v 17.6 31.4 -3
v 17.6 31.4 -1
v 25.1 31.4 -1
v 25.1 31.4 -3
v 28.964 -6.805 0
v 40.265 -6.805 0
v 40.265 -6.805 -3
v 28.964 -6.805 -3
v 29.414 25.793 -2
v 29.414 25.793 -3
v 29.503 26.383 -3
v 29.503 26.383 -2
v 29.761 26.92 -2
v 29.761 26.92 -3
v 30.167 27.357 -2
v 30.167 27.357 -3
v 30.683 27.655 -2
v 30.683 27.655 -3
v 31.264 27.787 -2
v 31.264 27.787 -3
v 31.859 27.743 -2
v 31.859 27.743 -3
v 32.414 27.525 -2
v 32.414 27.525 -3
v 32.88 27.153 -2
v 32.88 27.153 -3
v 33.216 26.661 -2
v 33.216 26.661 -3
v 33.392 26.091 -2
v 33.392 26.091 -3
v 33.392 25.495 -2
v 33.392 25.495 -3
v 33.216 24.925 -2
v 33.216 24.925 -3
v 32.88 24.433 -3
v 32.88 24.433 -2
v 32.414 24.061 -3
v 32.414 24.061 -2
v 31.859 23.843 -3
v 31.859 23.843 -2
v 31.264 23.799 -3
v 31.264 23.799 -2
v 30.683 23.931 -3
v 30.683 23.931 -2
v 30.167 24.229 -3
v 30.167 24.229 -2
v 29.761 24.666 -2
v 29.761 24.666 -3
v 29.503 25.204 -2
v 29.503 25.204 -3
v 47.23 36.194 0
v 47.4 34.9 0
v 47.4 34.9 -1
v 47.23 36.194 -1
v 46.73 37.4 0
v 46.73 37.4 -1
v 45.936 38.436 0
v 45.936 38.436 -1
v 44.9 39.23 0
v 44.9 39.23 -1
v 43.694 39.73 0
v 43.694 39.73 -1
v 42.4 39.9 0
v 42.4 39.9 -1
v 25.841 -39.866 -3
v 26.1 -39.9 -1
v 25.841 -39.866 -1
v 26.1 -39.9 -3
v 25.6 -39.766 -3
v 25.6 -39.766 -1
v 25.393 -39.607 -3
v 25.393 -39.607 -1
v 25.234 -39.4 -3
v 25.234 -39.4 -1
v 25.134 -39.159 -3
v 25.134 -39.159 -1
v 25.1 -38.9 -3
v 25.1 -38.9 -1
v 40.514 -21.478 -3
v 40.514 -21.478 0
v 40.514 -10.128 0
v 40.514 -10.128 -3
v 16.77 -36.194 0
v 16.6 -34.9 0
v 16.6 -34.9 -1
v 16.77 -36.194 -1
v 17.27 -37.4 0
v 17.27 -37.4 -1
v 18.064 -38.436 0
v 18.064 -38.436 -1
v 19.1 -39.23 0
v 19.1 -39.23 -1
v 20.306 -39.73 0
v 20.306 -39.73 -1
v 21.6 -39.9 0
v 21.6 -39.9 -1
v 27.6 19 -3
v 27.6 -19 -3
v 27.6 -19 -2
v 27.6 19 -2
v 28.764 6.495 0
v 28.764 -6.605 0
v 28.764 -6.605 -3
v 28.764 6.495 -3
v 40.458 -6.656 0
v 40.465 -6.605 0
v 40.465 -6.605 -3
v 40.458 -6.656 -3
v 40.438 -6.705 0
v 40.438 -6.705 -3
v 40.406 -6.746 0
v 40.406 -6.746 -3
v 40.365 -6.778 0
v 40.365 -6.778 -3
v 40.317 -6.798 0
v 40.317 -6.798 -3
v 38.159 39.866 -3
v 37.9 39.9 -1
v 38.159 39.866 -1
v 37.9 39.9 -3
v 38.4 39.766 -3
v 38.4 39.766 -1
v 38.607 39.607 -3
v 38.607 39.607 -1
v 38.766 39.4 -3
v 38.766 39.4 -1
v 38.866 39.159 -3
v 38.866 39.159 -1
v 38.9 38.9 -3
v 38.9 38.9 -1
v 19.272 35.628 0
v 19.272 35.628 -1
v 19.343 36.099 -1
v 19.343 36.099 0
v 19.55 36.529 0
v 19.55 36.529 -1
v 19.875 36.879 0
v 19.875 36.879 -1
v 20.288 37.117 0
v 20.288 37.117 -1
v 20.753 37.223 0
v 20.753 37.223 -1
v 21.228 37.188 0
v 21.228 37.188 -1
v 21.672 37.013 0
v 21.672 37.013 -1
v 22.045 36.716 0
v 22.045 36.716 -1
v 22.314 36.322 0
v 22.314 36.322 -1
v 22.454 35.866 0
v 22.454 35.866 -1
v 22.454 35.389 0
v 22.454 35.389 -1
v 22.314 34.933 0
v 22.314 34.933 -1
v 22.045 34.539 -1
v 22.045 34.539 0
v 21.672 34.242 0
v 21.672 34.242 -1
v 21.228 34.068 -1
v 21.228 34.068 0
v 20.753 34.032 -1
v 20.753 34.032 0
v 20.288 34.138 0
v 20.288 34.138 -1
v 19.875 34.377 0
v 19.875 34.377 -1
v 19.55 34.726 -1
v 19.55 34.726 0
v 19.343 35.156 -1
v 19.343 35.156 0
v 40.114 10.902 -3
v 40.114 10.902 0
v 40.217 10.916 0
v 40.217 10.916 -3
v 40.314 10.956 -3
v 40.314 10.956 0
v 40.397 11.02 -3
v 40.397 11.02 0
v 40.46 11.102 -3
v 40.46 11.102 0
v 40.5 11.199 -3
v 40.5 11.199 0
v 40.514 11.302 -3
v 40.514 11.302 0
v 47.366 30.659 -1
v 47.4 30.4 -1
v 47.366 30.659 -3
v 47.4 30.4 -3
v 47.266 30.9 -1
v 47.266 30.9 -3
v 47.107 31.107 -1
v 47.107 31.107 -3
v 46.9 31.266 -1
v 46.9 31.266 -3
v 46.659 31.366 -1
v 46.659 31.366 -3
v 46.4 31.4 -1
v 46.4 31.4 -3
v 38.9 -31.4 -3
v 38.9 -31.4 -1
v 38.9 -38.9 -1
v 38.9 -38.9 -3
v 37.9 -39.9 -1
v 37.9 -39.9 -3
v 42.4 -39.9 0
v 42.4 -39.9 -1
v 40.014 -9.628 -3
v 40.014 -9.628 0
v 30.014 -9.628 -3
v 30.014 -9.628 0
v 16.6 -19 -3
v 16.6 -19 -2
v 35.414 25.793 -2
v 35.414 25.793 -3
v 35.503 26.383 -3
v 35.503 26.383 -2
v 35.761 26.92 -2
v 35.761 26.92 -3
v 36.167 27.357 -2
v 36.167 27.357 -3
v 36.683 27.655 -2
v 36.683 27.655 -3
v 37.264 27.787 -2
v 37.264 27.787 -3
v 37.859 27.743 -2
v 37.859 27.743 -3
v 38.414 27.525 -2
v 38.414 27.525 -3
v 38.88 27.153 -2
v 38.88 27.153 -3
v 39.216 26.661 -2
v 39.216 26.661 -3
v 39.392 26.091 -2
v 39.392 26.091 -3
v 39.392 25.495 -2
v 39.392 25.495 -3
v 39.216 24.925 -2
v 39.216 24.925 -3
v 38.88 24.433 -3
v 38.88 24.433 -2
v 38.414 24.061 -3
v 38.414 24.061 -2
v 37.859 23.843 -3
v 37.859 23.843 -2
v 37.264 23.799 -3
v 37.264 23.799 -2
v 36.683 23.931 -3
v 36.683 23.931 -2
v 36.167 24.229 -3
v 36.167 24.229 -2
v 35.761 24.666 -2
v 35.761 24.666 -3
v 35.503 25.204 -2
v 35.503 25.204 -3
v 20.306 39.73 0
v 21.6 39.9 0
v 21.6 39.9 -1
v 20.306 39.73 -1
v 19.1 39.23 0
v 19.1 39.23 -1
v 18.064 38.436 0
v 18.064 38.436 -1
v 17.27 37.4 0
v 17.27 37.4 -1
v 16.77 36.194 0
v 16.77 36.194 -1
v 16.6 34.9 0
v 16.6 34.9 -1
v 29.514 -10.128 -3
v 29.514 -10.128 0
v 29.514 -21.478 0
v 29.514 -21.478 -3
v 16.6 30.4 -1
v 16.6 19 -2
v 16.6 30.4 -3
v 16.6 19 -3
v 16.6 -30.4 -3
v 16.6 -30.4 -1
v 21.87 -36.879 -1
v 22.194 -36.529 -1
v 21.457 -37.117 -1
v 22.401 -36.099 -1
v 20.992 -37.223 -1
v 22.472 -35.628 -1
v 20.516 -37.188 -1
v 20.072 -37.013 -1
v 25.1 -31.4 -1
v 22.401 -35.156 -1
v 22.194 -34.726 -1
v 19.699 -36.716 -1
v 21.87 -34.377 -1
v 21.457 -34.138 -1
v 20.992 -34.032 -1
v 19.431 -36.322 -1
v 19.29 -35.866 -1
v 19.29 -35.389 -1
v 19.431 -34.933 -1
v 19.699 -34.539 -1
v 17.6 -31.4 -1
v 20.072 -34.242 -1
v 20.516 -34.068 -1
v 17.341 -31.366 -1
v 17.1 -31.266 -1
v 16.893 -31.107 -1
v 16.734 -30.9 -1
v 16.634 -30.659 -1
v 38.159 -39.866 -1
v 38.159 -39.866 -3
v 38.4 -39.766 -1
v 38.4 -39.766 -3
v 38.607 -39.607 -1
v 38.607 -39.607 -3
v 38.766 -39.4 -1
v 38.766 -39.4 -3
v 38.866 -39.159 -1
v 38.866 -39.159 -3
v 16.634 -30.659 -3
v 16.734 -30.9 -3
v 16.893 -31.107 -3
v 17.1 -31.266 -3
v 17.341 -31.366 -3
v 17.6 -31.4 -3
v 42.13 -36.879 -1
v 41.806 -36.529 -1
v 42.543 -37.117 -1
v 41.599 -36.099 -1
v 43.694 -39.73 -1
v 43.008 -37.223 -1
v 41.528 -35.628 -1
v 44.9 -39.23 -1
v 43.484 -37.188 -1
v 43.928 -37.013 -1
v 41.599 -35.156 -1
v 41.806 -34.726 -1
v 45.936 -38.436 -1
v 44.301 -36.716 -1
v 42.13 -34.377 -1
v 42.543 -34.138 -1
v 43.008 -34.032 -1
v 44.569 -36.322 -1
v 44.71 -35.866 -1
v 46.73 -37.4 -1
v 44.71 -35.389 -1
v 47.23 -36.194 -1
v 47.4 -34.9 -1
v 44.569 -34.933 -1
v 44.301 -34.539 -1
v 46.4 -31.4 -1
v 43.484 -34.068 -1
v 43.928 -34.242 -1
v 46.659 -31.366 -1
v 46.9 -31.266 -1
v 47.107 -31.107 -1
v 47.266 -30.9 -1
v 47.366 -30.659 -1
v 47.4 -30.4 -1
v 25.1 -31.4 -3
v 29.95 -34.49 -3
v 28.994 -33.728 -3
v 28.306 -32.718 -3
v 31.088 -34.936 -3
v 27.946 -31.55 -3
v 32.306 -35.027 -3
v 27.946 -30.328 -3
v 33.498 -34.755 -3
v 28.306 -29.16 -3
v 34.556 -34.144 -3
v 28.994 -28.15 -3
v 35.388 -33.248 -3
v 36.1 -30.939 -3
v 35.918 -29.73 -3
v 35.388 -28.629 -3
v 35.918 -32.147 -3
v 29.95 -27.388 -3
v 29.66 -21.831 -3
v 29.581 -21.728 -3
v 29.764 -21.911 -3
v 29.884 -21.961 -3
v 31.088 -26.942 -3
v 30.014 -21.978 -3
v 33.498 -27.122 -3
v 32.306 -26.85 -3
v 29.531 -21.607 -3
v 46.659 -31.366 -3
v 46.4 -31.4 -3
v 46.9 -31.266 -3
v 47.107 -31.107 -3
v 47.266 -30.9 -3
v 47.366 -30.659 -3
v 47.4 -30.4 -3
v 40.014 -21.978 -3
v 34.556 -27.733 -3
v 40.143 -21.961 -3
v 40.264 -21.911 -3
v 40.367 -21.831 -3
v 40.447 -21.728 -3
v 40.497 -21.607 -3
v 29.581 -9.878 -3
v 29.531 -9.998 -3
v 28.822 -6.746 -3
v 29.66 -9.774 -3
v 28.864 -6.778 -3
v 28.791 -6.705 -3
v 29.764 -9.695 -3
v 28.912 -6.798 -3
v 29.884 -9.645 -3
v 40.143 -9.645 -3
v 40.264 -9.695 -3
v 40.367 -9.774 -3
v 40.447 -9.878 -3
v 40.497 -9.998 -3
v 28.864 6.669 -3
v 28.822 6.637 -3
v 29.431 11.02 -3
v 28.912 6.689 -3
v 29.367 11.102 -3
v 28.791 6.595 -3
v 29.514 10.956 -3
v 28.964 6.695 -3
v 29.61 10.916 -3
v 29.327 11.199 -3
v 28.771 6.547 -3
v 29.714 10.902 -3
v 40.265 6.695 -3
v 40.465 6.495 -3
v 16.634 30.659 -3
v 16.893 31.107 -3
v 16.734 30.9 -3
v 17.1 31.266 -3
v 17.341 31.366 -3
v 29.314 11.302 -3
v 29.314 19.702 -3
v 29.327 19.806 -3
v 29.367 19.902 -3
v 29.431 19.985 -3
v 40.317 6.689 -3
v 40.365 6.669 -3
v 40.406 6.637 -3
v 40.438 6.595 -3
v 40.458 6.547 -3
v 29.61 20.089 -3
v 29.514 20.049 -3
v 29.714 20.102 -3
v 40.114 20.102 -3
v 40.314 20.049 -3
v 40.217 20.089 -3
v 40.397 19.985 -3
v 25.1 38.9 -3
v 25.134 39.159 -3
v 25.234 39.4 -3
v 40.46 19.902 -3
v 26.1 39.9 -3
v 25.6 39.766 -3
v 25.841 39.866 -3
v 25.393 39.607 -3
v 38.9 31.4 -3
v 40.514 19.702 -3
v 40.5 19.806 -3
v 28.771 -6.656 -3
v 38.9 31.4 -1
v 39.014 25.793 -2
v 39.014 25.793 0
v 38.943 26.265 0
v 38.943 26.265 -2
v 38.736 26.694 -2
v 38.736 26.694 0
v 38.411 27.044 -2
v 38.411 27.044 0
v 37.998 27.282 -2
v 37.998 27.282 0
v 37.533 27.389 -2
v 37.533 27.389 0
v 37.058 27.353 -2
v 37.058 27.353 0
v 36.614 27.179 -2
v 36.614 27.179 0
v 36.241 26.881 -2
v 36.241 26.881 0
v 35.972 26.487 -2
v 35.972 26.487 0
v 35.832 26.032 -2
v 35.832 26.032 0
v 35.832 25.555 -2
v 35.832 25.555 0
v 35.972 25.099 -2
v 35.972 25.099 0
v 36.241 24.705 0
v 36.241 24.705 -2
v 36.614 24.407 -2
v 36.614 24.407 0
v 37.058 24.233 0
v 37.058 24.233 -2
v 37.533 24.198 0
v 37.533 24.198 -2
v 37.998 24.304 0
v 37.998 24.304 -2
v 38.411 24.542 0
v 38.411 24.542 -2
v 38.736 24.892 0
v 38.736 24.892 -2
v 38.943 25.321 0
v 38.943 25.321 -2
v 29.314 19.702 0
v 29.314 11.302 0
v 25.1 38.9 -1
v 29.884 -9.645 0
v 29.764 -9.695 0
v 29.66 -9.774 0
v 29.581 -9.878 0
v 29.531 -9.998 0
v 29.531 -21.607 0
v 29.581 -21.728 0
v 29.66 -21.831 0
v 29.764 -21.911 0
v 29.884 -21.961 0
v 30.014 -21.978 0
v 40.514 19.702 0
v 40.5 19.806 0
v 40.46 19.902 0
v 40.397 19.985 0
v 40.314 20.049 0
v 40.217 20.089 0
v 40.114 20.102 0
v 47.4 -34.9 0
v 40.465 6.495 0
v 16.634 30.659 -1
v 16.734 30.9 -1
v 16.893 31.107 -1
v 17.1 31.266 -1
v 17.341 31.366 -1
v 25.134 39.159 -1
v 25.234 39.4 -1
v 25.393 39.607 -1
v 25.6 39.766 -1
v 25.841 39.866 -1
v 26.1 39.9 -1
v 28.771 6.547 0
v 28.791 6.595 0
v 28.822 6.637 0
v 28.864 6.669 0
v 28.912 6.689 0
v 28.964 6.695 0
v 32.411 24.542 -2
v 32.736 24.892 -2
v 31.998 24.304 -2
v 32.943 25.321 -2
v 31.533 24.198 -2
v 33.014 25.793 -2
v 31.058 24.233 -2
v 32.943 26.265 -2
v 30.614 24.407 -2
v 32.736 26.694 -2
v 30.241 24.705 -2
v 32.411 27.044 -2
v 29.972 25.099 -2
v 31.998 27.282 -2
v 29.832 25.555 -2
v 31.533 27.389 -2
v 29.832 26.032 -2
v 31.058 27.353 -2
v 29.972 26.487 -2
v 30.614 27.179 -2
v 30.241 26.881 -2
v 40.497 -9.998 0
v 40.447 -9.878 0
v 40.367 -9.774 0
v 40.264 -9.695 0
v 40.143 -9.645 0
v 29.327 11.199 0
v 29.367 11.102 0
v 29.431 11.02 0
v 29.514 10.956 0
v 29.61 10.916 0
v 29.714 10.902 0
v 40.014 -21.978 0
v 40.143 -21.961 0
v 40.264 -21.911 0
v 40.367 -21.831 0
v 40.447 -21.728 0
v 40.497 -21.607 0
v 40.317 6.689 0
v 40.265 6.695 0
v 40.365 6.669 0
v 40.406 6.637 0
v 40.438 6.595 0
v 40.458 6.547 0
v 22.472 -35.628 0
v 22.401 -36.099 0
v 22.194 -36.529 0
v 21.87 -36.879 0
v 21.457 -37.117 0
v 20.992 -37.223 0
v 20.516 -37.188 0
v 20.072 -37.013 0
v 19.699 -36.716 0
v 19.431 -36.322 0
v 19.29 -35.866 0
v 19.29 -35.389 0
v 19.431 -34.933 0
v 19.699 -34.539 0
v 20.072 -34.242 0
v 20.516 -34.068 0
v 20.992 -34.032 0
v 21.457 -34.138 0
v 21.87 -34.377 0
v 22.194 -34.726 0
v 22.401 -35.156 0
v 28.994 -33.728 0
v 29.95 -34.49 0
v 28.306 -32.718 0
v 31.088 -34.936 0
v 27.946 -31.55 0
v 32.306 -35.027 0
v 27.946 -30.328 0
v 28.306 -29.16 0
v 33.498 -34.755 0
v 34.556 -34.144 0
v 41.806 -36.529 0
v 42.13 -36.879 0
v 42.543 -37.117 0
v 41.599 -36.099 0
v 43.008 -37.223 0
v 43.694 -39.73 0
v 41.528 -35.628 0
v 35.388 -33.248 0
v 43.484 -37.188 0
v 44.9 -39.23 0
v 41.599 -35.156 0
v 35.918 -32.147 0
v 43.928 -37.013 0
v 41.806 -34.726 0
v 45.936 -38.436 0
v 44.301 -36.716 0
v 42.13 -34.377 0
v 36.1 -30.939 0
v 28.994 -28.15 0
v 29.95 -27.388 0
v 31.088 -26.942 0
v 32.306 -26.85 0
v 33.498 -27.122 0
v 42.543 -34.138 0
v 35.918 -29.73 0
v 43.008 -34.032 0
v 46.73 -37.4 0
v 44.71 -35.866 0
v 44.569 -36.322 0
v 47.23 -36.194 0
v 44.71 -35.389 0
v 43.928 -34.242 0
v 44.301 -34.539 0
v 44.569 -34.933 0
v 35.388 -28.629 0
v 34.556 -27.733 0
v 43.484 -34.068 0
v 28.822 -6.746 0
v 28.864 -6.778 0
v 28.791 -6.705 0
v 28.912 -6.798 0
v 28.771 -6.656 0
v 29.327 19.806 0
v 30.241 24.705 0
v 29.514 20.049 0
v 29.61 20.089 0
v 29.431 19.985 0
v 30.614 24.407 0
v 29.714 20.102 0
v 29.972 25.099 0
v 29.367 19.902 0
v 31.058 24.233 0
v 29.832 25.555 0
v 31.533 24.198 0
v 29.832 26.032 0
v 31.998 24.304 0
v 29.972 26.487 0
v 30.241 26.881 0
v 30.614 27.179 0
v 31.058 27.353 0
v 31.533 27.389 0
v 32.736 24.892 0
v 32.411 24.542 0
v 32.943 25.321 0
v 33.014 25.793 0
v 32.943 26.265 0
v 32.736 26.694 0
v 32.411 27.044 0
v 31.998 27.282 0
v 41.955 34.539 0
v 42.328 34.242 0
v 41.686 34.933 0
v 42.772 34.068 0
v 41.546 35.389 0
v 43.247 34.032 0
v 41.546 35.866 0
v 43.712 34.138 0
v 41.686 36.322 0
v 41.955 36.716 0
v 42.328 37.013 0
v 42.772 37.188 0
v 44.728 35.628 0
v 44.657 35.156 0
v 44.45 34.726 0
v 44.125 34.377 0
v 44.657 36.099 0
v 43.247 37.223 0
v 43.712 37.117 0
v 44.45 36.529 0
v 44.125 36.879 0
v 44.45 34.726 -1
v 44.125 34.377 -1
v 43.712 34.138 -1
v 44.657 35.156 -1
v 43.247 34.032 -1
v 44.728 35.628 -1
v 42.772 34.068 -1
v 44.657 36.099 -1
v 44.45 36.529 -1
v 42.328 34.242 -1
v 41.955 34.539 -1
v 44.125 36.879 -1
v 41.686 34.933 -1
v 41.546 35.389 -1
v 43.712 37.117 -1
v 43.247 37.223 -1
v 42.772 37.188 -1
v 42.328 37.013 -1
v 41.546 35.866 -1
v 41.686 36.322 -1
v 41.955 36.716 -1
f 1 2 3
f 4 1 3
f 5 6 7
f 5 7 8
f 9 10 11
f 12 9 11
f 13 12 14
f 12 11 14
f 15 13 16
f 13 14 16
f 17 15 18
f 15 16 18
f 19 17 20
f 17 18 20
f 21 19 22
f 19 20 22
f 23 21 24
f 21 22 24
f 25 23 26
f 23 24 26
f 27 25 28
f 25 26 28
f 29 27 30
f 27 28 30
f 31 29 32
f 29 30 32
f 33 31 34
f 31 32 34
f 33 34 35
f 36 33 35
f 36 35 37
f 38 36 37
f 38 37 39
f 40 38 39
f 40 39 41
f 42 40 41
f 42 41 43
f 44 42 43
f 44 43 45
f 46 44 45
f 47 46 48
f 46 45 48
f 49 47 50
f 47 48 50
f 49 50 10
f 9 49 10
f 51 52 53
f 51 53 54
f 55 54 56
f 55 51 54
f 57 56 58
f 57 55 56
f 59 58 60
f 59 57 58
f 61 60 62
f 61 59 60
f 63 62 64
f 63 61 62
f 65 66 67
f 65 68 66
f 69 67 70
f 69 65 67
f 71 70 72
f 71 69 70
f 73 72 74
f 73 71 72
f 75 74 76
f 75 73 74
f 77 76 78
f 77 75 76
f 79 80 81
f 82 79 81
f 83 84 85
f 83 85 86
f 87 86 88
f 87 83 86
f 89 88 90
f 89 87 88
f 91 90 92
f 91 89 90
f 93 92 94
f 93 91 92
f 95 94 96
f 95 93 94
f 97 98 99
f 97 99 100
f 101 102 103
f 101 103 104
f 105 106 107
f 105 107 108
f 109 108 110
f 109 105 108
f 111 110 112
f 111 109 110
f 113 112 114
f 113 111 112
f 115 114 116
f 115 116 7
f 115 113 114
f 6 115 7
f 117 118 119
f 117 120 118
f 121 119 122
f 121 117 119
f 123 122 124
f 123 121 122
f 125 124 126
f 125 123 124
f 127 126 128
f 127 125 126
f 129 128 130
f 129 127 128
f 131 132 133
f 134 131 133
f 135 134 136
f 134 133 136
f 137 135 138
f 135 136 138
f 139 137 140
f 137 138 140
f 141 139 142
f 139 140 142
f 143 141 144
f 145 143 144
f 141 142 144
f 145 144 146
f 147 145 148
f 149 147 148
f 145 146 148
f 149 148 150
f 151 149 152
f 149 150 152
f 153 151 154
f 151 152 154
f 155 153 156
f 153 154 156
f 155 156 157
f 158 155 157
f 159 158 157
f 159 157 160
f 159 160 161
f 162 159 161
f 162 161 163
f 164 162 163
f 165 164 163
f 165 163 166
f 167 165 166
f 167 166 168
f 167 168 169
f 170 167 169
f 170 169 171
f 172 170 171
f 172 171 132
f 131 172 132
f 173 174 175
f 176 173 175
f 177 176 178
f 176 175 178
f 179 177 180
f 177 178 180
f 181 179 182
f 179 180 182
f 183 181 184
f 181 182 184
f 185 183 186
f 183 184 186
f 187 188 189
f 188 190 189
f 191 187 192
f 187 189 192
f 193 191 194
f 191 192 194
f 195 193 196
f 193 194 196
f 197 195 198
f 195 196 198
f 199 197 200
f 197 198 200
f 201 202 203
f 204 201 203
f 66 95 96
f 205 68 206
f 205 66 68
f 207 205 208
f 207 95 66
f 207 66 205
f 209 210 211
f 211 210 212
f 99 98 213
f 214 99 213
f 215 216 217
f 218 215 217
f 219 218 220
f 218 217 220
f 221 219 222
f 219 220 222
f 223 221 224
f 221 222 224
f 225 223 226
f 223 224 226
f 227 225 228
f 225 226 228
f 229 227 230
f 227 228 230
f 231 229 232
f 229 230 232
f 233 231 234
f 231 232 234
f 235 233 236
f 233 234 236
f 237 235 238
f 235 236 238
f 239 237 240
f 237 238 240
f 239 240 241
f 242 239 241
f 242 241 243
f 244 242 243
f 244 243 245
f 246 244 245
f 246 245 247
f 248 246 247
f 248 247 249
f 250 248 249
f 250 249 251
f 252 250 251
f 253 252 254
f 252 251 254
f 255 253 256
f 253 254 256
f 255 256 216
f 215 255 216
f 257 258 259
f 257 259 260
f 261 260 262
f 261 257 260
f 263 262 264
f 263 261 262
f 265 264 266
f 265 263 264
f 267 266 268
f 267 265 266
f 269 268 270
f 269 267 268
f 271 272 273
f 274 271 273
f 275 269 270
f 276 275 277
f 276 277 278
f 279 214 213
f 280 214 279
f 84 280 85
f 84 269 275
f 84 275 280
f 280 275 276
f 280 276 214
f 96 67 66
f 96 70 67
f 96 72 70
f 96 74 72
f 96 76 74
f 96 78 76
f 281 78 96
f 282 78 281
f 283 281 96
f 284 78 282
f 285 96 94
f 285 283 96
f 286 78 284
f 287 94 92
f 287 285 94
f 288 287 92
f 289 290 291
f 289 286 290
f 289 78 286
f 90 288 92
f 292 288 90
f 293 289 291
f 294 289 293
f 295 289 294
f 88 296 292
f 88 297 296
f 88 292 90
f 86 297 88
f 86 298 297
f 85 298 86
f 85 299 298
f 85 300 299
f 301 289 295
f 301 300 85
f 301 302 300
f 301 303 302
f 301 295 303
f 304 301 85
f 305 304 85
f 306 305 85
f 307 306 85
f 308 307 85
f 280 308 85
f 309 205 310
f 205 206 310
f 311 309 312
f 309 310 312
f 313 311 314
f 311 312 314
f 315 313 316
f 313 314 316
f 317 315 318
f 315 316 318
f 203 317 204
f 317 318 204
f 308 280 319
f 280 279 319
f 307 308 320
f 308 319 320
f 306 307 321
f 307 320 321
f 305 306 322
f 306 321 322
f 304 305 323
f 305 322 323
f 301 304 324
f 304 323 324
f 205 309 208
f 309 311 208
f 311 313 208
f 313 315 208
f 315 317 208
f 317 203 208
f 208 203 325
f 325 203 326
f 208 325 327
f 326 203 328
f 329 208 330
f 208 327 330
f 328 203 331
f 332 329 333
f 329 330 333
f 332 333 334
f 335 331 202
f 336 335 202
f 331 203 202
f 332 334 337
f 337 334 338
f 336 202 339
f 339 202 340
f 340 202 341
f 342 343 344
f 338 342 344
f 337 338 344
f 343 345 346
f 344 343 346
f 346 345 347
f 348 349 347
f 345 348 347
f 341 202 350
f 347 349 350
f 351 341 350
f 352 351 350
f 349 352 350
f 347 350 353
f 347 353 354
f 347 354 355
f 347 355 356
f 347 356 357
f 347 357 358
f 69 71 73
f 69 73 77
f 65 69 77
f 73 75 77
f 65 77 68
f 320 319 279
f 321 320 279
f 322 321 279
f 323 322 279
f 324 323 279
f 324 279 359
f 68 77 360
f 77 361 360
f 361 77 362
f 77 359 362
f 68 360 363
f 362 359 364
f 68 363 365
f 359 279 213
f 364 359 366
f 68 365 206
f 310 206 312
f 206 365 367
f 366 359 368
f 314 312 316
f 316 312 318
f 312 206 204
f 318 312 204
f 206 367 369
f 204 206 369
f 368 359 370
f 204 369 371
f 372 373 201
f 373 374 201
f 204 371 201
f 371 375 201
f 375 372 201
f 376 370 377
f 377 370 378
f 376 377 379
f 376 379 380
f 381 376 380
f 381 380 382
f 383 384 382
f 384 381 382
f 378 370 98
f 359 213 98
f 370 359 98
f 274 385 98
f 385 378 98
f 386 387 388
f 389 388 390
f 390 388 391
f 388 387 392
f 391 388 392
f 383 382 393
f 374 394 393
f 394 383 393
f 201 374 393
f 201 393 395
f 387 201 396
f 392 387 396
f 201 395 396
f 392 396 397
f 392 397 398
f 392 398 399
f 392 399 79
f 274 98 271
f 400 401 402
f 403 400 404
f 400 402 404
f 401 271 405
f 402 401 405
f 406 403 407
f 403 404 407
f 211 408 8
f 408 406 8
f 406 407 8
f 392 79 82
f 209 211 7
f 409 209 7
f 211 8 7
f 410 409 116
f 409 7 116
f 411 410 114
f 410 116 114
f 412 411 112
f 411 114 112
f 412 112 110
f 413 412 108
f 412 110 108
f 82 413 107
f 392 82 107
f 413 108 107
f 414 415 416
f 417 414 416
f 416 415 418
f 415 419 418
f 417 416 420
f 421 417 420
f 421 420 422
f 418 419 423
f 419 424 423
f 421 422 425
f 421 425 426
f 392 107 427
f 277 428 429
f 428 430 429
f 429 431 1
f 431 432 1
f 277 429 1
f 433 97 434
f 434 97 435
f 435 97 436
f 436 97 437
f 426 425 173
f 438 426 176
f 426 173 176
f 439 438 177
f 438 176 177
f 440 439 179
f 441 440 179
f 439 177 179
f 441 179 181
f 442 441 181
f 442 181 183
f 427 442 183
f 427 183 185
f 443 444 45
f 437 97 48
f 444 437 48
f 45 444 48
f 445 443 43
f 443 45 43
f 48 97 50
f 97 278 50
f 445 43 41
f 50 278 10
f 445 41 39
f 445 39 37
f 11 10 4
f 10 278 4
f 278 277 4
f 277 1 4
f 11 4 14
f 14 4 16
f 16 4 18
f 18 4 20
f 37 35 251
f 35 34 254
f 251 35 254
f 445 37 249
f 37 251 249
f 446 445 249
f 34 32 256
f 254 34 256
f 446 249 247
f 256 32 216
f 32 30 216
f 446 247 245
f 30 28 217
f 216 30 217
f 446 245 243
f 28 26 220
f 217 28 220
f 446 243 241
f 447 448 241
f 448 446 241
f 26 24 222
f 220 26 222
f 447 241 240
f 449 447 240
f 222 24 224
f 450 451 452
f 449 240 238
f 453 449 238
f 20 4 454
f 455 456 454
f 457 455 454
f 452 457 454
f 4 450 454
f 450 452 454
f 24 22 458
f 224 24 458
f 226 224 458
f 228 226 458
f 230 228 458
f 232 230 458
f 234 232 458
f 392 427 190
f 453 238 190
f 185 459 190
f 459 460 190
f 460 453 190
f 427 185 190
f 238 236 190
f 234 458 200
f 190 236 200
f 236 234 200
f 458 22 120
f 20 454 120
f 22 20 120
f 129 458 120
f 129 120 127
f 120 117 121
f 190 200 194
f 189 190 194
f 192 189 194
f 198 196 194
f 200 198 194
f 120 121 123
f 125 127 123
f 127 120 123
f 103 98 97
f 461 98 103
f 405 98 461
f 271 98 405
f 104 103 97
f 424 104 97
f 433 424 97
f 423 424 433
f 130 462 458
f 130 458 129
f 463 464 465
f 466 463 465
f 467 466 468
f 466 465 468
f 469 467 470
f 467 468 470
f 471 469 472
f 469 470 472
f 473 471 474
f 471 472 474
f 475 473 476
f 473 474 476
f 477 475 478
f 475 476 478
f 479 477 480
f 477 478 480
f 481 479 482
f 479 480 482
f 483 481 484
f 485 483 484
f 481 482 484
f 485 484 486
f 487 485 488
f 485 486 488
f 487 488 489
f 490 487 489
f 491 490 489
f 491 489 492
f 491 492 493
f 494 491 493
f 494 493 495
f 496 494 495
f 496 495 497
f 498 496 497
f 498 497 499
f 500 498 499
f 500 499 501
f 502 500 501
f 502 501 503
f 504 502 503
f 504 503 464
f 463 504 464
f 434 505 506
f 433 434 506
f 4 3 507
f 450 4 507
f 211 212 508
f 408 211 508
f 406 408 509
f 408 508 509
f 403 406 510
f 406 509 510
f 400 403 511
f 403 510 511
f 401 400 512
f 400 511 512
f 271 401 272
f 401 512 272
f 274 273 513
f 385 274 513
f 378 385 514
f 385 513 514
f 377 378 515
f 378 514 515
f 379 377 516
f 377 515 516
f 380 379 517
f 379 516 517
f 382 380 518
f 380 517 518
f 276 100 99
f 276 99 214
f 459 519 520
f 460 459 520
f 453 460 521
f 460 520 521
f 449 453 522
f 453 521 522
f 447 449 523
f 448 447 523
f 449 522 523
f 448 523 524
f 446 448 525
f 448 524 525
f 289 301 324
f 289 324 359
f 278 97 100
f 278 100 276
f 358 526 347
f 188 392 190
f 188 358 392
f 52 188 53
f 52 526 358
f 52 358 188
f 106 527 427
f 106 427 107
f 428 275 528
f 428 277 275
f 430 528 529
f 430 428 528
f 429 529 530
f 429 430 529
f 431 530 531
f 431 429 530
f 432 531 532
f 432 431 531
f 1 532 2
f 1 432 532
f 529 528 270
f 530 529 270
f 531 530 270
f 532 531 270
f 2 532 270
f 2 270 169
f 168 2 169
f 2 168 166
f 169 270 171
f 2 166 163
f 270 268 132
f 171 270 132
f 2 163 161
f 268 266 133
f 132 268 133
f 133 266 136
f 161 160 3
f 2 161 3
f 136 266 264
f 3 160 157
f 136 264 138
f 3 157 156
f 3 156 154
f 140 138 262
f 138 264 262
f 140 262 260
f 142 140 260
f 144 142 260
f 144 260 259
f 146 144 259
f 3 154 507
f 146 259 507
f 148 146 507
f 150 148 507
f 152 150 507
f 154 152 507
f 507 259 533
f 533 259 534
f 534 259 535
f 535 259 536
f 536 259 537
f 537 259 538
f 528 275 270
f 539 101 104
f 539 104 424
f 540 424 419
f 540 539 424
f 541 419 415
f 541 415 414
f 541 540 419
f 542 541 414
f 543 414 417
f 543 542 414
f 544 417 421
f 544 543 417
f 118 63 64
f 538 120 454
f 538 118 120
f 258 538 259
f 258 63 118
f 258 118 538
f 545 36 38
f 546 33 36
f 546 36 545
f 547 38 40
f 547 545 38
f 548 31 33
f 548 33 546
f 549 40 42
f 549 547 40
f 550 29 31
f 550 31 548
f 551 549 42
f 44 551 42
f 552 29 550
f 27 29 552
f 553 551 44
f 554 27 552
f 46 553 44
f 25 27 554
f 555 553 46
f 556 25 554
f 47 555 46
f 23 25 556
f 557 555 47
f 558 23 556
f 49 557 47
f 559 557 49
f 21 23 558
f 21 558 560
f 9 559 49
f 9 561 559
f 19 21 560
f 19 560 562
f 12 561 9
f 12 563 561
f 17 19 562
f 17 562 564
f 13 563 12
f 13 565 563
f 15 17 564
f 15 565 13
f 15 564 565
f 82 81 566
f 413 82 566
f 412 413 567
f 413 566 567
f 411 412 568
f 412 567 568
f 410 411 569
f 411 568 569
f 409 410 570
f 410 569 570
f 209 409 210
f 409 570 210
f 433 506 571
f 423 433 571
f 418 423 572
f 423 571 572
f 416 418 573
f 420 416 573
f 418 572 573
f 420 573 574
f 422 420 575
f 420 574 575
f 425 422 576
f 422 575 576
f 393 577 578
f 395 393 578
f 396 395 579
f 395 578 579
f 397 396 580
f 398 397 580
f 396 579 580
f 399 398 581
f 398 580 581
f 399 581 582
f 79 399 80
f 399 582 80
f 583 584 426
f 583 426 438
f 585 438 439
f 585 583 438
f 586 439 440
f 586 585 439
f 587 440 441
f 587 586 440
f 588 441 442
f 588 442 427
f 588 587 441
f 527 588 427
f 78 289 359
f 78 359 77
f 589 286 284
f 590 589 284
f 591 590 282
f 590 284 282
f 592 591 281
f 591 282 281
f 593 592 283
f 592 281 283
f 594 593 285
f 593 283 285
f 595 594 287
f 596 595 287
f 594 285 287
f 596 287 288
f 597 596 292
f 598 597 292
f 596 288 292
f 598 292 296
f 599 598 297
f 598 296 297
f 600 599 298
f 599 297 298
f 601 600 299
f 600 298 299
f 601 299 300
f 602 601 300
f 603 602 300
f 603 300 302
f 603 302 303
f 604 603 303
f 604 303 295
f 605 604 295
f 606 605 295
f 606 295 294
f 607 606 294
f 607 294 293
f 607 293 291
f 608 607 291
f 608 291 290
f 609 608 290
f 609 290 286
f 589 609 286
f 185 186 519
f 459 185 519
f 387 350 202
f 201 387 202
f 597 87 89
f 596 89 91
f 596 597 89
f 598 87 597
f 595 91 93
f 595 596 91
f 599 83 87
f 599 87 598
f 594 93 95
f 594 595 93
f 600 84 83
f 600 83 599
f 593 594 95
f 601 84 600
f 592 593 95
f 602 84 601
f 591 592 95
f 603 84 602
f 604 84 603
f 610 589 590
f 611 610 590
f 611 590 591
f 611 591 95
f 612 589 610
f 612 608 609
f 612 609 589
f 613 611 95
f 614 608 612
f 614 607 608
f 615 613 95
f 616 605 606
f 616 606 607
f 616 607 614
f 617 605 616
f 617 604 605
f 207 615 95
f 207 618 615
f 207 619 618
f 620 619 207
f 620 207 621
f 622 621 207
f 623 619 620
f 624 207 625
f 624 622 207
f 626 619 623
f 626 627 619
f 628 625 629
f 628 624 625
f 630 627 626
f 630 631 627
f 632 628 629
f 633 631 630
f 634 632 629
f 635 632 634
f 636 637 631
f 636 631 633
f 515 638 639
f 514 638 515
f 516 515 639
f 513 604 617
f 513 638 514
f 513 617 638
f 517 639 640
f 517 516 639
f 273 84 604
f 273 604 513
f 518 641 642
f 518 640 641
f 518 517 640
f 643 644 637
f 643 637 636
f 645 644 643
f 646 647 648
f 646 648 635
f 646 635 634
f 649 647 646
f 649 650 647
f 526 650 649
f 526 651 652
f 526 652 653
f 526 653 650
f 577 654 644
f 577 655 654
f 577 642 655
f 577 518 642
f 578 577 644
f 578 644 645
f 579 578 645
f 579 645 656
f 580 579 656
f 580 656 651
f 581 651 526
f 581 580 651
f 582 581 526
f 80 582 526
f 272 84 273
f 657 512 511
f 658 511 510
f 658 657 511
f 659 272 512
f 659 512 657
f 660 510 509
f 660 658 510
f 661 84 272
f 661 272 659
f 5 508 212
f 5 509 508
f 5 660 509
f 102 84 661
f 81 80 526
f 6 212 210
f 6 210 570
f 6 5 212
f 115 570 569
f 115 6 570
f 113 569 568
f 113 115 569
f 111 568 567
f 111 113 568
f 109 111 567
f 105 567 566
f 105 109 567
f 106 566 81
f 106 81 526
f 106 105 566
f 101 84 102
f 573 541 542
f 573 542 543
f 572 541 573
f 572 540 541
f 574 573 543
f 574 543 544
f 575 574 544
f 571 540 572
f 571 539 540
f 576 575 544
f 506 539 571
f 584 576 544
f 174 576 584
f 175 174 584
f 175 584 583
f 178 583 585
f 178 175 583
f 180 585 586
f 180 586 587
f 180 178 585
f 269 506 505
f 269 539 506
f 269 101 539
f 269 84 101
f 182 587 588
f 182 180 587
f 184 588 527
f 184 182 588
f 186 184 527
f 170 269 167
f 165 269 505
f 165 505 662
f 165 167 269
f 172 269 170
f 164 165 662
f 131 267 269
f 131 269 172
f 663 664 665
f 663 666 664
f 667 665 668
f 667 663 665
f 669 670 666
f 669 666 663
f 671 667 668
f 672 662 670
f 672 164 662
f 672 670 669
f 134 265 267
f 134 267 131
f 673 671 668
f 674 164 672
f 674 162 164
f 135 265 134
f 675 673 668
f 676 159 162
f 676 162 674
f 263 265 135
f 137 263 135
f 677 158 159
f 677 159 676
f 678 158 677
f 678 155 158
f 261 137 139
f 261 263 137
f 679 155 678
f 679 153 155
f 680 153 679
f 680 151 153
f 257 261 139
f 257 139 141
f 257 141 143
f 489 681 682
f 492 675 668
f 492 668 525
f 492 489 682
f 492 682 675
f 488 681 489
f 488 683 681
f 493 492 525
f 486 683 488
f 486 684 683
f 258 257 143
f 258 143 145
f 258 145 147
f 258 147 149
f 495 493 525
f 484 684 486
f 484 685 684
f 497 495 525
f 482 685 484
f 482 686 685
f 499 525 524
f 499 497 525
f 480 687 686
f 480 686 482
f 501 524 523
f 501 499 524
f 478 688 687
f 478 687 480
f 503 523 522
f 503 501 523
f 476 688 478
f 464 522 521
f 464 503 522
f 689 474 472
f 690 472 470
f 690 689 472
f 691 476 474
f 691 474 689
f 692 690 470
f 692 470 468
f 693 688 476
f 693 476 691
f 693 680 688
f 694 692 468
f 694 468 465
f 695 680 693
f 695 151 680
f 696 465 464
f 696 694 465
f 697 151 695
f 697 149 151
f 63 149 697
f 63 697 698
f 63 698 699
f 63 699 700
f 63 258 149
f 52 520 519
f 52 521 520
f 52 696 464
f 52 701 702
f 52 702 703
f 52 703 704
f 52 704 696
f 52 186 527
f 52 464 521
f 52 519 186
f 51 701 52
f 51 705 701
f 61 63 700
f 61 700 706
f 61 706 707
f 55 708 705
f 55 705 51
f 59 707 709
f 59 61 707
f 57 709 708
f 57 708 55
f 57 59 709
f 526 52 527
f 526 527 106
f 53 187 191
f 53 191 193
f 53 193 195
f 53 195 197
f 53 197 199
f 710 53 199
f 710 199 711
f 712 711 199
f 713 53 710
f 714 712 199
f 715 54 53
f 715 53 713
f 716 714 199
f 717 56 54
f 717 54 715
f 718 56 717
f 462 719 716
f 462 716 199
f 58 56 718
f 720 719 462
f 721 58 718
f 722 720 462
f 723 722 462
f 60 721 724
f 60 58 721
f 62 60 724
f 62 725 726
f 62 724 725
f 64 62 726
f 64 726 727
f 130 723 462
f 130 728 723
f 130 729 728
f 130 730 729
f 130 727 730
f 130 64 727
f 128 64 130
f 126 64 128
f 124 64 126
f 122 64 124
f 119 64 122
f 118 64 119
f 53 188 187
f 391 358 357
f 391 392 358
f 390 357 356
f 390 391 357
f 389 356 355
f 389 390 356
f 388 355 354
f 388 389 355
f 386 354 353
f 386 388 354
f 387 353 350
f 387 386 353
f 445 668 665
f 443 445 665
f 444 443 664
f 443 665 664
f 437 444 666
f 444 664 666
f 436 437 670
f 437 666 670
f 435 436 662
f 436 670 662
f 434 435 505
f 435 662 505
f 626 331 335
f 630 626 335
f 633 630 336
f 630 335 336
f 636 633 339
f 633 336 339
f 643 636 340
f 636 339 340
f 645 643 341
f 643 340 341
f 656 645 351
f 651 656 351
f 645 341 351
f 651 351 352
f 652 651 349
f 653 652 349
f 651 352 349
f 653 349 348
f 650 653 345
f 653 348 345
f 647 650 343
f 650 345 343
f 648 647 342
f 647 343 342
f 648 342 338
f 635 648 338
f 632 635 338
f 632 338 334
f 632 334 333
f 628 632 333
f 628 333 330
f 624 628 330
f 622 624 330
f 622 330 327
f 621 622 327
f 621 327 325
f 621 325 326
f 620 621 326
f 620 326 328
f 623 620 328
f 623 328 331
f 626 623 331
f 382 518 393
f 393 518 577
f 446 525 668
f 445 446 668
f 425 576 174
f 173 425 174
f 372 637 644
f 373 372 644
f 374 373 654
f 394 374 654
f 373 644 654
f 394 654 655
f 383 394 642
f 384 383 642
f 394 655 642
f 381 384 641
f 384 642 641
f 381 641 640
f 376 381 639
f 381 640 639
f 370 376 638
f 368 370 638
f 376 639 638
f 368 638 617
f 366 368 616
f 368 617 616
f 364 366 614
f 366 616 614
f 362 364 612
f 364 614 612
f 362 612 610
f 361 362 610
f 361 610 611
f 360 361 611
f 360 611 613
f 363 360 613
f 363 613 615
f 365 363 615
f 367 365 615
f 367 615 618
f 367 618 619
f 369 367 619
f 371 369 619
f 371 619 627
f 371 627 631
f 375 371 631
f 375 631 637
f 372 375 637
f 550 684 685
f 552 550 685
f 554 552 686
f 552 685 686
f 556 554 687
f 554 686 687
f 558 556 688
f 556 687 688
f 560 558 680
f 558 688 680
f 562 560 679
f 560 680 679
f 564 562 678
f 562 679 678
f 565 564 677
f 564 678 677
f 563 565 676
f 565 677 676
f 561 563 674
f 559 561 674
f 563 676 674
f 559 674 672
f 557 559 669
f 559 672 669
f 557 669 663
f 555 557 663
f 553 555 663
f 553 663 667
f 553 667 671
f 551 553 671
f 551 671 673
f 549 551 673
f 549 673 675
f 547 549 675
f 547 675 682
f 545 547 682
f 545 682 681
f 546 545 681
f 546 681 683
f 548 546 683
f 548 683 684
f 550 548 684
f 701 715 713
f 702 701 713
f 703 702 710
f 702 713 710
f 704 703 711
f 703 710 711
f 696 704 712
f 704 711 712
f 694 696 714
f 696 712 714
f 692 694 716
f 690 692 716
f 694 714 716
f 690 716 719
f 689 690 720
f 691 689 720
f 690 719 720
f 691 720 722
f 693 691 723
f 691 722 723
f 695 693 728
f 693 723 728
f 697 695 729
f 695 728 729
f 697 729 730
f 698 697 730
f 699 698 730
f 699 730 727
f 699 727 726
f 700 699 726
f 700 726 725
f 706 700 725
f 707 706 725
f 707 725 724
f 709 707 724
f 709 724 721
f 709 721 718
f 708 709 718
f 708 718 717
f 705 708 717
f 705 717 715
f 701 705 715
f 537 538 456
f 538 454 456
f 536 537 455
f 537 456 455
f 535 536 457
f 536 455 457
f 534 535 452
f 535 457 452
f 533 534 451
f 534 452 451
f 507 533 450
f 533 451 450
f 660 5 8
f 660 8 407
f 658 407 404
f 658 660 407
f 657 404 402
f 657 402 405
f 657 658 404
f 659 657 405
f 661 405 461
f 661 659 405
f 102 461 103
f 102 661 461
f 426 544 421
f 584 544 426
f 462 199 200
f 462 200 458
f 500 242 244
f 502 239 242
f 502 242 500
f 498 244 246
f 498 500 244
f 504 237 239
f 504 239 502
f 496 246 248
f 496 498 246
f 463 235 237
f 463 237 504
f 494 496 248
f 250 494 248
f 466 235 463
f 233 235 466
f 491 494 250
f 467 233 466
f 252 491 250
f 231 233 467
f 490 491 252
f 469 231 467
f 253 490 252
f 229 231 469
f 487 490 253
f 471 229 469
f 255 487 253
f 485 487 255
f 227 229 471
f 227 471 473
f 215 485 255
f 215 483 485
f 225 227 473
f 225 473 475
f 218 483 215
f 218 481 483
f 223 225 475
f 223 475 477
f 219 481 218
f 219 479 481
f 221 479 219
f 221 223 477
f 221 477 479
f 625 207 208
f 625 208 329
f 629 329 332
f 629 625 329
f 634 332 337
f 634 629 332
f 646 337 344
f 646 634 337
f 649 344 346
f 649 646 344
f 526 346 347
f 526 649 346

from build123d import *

# Parameters (mm, degrees)
SKETCH_1_R          = 1.6
EXTRUDE_1_DEPTH     = 3
SKETCH_2_W          = 11
SKETCH_2_H          = 38
CUT_EXTRUDE_1_DEPTH = 1
CUT_EXTRUDE_START   = -2
CUT_EXTRUDE_2_DEPTH = 2
SKETCH_4_R          = 1.6
CUT_EXTRUDE_3_DEPTH = 62.990079852
SKETCH_6_R          = 2
CUT_EXTRUDE_4_DEPTH = 1
SKETCH_7_R          = 4.1
CUT_EXTRUDE_5_DEPTH = 63.030395775
FILLET_1_R          = 1


with BuildPart() as part:
    # 草图1 → 凸台-拉伸1 (new body)
    with BuildSketch(Plane.XY):
        with BuildLine():
            Line((47.4, -34.9), (47.4, 34.9))
            ThreePointArc((47.4, 34.9), (45.935533906, 38.435533906), (42.4, 39.9))
            Line((42.4, 39.9), (21.6, 39.9))
            ThreePointArc((21.6, 39.9), (18.064466094, 38.435533906), (16.6, 34.9))
            Line((16.6, 34.9), (16.6, -34.9))
            ThreePointArc((16.6, -34.9), (18.064466094, -38.435533906), (21.6, -39.9))
            Line((21.6, -39.9), (42.4, -39.9))
            ThreePointArc((42.4, -39.9), (45.935533906, -38.435533906), (47.4, -34.9))
        make_face()
        with Locations((37.413843028, 25.79305128)):
            Circle(SKETCH_1_R, mode=Mode.SUBTRACT)
        with Locations((31.413843028, 25.79305128)):
            Circle(SKETCH_1_R, mode=Mode.SUBTRACT)
        with BuildLine():
            Line((40.513850359, -21.477641558), (40.513850359, -10.127641653))
            ThreePointArc((40.513850359, -10.127641653), (40.367403749, -9.774088262), (40.013850359, -9.627641653))
            Line((40.013850359, -9.627641653), (30.013850359, -9.627641653))
            ThreePointArc((30.013850359, -9.627641653), (29.660296968, -9.774088262), (29.513850359, -10.127641653))
            Line((29.513850359, -10.127641653), (29.513850359, -21.477641558))
            ThreePointArc((29.513850359, -21.477641558), (29.660296968, -21.831194949), (30.013850359, -21.977641558))
            Line((30.013850359, -21.977641558), (40.013850359, -21.977641558))
            ThreePointArc((40.013850359, -21.977641558), (40.367403749, -21.831194949), (40.513850359, -21.477641558))
        make_face(mode=Mode.SUBTRACT)
        with BuildLine():
            Line((40.464996896, 6.495389649), (40.464996896, -6.604609867))
            ThreePointArc((40.464996896, -6.604609867), (40.406418252, -6.746031223), (40.264996896, -6.804609867))
            Line((40.264996896, -6.804609867), (28.963873947, -6.804609867))
            ThreePointArc((28.963873947, -6.804609867), (28.822452591, -6.746031223), (28.763873947, -6.604609867))
            Line((28.763873947, -6.604609867), (28.763873947, 6.495389649))
            ThreePointArc((28.763873947, 6.495389649), (28.822452591, 6.636811005), (28.963873947, 6.695389649))
            Line((28.963873947, 6.695389649), (40.264996896, 6.695389649))
            ThreePointArc((40.264996896, 6.695389649), (40.406418252, 6.636811005), (40.464996896, 6.495389649))
        make_face(mode=Mode.SUBTRACT)
        with BuildLine():
            Line((40.513843009, 11.302412116), (40.513843009, 19.702429875))
            ThreePointArc((40.513843009, 19.702429875), (40.396685721, 19.985272588), (40.113843009, 20.102429875))
            Line((40.113843009, 20.102429875), (29.713821303, 20.102429875))
            ThreePointArc((29.713821303, 20.102429875), (29.43097859, 19.985272588), (29.313821303, 19.702429875))
            Line((29.313821303, 19.702429875), (29.313821303, 11.302412116))
            ThreePointArc((29.313821303, 11.302412116), (29.43097859, 11.019569403), (29.713821303, 10.902412116))
            Line((29.713821303, 10.902412116), (40.113843009, 10.902412116))
            ThreePointArc((40.113843009, 10.902412116), (40.396685721, 11.019569403), (40.513843009, 11.302412116))
        make_face(mode=Mode.SUBTRACT)
    extrude(amount=-EXTRUDE_1_DEPTH)

    # 草图2 → 切除-拉伸1 (cut)
    with BuildSketch(Plane(origin=(0, 0, -3), x_dir=(-1, 0, 0), z_dir=(0, 0, -1))):
        with Locations((-22.1, 0)):
            Rectangle(SKETCH_2_W, SKETCH_2_H)
    extrude(amount=-CUT_EXTRUDE_1_DEPTH, mode=Mode.SUBTRACT)

    # 草图3 → 切除-拉伸2 (cut)
    with BuildSketch(Plane(origin=(0, 0, -3), x_dir=(-1, 0, 0), z_dir=(0, 0, -1)).offset(CUT_EXTRUDE_START)):
        with BuildLine():
            Line((-47.4, -31.4), (-38.9, -31.4))
            Line((-38.9, -31.4), (-38.9, -39.9))
            Line((-38.9, -39.9), (-42.4, -39.9))
            ThreePointArc((-42.4, -39.9), (-45.935533906, -38.435533906), (-47.4, -34.9))
            Line((-47.4, -34.9), (-47.4, -31.4))
        make_face()
        with BuildLine():
            Line((-47.4, 34.9), (-47.4, 31.4))
            Line((-47.4, 31.4), (-38.9, 31.4))
            Line((-38.9, 31.4), (-38.9, 39.9))
            Line((-38.9, 39.9), (-42.4, 39.9))
            ThreePointArc((-42.4, 39.9), (-45.935533906, 38.435533906), (-47.4, 34.9))
        make_face()
        with BuildLine():
            Line((-16.6, 31.4), (-25.1, 31.4))
            Line((-25.1, 31.4), (-25.1, 39.9))
            Line((-25.1, 39.9), (-21.6, 39.9))
            ThreePointArc((-21.6, 39.9), (-18.064466094, 38.435533906), (-16.6, 34.9))
            Line((-16.6, 34.9), (-16.6, 31.4))
        make_face()
        with BuildLine():
            Line((-16.6, -34.9), (-16.6, -31.4))
            Line((-16.6, -31.4), (-25.1, -31.4))
            Line((-25.1, -31.4), (-25.1, -39.9))
            Line((-25.1, -39.9), (-21.6, -39.9))
            ThreePointArc((-21.6, -39.9), (-18.064466094, -38.435533906), (-16.6, -34.9))
        make_face()
    extrude(amount=CUT_EXTRUDE_2_DEPTH, mode=Mode.SUBTRACT)

    # 草图4 → 切除-拉伸3 (cut, through all)
    with BuildSketch(Plane(origin=(0, 0, -1), x_dir=(-1, 0, 0), z_dir=(0, 0, -1))):
        with Locations((-20.872307757, 35.627692243)):
            Circle(SKETCH_4_R)
        with Locations(Location((-20.872307757, -35.627692243, 0), (0, 0, 180))):
            Circle(SKETCH_4_R)
        with Locations((-43.127692243, -35.627692243)):
            Circle(SKETCH_4_R)
        with Locations(Location((-43.127692243, 35.627692243, 0), (0, 0, 180))):
            Circle(SKETCH_4_R)
    extrude(amount=-CUT_EXTRUDE_3_DEPTH, mode=Mode.SUBTRACT)

    # 草图6 → 切除-拉伸4 (cut)
    with BuildSketch(Plane(origin=(0, 0, -3), x_dir=(-1, 0, 0), z_dir=(0, 0, -1))):
        with Locations((-37.413843028, 25.79305128)):
            Circle(SKETCH_6_R)
        with Locations((-31.413843028, 25.79305128)):
            Circle(SKETCH_6_R)
    extrude(amount=-CUT_EXTRUDE_4_DEPTH, mode=Mode.SUBTRACT)

    # 草图7 → 切除-拉伸5 (cut, through all)
    with BuildSketch(Plane.XY):
        with Locations((32, -30.938820779)):
            Circle(SKETCH_7_R)
    extrude(amount=-CUT_EXTRUDE_5_DEPTH, mode=Mode.SUBTRACT)

    # 圆角1
    fillet_1_edges = [part.edges().sort_by_distance(p)[0] for p in [
        (25.1, -39.9, -2),
        (16.6, -31.4, -2),
        (16.6, 31.4, -2),
        (25.1, 39.9, -2),
        (38.9, 39.9, -2),
        (47.4, 31.4, -2),
        (47.4, -31.4, -2),
        (38.9, -39.9, -2),
    ]]
    fillet(fillet_1_edges, radius=FILLET_1_R)


solid = part.part
